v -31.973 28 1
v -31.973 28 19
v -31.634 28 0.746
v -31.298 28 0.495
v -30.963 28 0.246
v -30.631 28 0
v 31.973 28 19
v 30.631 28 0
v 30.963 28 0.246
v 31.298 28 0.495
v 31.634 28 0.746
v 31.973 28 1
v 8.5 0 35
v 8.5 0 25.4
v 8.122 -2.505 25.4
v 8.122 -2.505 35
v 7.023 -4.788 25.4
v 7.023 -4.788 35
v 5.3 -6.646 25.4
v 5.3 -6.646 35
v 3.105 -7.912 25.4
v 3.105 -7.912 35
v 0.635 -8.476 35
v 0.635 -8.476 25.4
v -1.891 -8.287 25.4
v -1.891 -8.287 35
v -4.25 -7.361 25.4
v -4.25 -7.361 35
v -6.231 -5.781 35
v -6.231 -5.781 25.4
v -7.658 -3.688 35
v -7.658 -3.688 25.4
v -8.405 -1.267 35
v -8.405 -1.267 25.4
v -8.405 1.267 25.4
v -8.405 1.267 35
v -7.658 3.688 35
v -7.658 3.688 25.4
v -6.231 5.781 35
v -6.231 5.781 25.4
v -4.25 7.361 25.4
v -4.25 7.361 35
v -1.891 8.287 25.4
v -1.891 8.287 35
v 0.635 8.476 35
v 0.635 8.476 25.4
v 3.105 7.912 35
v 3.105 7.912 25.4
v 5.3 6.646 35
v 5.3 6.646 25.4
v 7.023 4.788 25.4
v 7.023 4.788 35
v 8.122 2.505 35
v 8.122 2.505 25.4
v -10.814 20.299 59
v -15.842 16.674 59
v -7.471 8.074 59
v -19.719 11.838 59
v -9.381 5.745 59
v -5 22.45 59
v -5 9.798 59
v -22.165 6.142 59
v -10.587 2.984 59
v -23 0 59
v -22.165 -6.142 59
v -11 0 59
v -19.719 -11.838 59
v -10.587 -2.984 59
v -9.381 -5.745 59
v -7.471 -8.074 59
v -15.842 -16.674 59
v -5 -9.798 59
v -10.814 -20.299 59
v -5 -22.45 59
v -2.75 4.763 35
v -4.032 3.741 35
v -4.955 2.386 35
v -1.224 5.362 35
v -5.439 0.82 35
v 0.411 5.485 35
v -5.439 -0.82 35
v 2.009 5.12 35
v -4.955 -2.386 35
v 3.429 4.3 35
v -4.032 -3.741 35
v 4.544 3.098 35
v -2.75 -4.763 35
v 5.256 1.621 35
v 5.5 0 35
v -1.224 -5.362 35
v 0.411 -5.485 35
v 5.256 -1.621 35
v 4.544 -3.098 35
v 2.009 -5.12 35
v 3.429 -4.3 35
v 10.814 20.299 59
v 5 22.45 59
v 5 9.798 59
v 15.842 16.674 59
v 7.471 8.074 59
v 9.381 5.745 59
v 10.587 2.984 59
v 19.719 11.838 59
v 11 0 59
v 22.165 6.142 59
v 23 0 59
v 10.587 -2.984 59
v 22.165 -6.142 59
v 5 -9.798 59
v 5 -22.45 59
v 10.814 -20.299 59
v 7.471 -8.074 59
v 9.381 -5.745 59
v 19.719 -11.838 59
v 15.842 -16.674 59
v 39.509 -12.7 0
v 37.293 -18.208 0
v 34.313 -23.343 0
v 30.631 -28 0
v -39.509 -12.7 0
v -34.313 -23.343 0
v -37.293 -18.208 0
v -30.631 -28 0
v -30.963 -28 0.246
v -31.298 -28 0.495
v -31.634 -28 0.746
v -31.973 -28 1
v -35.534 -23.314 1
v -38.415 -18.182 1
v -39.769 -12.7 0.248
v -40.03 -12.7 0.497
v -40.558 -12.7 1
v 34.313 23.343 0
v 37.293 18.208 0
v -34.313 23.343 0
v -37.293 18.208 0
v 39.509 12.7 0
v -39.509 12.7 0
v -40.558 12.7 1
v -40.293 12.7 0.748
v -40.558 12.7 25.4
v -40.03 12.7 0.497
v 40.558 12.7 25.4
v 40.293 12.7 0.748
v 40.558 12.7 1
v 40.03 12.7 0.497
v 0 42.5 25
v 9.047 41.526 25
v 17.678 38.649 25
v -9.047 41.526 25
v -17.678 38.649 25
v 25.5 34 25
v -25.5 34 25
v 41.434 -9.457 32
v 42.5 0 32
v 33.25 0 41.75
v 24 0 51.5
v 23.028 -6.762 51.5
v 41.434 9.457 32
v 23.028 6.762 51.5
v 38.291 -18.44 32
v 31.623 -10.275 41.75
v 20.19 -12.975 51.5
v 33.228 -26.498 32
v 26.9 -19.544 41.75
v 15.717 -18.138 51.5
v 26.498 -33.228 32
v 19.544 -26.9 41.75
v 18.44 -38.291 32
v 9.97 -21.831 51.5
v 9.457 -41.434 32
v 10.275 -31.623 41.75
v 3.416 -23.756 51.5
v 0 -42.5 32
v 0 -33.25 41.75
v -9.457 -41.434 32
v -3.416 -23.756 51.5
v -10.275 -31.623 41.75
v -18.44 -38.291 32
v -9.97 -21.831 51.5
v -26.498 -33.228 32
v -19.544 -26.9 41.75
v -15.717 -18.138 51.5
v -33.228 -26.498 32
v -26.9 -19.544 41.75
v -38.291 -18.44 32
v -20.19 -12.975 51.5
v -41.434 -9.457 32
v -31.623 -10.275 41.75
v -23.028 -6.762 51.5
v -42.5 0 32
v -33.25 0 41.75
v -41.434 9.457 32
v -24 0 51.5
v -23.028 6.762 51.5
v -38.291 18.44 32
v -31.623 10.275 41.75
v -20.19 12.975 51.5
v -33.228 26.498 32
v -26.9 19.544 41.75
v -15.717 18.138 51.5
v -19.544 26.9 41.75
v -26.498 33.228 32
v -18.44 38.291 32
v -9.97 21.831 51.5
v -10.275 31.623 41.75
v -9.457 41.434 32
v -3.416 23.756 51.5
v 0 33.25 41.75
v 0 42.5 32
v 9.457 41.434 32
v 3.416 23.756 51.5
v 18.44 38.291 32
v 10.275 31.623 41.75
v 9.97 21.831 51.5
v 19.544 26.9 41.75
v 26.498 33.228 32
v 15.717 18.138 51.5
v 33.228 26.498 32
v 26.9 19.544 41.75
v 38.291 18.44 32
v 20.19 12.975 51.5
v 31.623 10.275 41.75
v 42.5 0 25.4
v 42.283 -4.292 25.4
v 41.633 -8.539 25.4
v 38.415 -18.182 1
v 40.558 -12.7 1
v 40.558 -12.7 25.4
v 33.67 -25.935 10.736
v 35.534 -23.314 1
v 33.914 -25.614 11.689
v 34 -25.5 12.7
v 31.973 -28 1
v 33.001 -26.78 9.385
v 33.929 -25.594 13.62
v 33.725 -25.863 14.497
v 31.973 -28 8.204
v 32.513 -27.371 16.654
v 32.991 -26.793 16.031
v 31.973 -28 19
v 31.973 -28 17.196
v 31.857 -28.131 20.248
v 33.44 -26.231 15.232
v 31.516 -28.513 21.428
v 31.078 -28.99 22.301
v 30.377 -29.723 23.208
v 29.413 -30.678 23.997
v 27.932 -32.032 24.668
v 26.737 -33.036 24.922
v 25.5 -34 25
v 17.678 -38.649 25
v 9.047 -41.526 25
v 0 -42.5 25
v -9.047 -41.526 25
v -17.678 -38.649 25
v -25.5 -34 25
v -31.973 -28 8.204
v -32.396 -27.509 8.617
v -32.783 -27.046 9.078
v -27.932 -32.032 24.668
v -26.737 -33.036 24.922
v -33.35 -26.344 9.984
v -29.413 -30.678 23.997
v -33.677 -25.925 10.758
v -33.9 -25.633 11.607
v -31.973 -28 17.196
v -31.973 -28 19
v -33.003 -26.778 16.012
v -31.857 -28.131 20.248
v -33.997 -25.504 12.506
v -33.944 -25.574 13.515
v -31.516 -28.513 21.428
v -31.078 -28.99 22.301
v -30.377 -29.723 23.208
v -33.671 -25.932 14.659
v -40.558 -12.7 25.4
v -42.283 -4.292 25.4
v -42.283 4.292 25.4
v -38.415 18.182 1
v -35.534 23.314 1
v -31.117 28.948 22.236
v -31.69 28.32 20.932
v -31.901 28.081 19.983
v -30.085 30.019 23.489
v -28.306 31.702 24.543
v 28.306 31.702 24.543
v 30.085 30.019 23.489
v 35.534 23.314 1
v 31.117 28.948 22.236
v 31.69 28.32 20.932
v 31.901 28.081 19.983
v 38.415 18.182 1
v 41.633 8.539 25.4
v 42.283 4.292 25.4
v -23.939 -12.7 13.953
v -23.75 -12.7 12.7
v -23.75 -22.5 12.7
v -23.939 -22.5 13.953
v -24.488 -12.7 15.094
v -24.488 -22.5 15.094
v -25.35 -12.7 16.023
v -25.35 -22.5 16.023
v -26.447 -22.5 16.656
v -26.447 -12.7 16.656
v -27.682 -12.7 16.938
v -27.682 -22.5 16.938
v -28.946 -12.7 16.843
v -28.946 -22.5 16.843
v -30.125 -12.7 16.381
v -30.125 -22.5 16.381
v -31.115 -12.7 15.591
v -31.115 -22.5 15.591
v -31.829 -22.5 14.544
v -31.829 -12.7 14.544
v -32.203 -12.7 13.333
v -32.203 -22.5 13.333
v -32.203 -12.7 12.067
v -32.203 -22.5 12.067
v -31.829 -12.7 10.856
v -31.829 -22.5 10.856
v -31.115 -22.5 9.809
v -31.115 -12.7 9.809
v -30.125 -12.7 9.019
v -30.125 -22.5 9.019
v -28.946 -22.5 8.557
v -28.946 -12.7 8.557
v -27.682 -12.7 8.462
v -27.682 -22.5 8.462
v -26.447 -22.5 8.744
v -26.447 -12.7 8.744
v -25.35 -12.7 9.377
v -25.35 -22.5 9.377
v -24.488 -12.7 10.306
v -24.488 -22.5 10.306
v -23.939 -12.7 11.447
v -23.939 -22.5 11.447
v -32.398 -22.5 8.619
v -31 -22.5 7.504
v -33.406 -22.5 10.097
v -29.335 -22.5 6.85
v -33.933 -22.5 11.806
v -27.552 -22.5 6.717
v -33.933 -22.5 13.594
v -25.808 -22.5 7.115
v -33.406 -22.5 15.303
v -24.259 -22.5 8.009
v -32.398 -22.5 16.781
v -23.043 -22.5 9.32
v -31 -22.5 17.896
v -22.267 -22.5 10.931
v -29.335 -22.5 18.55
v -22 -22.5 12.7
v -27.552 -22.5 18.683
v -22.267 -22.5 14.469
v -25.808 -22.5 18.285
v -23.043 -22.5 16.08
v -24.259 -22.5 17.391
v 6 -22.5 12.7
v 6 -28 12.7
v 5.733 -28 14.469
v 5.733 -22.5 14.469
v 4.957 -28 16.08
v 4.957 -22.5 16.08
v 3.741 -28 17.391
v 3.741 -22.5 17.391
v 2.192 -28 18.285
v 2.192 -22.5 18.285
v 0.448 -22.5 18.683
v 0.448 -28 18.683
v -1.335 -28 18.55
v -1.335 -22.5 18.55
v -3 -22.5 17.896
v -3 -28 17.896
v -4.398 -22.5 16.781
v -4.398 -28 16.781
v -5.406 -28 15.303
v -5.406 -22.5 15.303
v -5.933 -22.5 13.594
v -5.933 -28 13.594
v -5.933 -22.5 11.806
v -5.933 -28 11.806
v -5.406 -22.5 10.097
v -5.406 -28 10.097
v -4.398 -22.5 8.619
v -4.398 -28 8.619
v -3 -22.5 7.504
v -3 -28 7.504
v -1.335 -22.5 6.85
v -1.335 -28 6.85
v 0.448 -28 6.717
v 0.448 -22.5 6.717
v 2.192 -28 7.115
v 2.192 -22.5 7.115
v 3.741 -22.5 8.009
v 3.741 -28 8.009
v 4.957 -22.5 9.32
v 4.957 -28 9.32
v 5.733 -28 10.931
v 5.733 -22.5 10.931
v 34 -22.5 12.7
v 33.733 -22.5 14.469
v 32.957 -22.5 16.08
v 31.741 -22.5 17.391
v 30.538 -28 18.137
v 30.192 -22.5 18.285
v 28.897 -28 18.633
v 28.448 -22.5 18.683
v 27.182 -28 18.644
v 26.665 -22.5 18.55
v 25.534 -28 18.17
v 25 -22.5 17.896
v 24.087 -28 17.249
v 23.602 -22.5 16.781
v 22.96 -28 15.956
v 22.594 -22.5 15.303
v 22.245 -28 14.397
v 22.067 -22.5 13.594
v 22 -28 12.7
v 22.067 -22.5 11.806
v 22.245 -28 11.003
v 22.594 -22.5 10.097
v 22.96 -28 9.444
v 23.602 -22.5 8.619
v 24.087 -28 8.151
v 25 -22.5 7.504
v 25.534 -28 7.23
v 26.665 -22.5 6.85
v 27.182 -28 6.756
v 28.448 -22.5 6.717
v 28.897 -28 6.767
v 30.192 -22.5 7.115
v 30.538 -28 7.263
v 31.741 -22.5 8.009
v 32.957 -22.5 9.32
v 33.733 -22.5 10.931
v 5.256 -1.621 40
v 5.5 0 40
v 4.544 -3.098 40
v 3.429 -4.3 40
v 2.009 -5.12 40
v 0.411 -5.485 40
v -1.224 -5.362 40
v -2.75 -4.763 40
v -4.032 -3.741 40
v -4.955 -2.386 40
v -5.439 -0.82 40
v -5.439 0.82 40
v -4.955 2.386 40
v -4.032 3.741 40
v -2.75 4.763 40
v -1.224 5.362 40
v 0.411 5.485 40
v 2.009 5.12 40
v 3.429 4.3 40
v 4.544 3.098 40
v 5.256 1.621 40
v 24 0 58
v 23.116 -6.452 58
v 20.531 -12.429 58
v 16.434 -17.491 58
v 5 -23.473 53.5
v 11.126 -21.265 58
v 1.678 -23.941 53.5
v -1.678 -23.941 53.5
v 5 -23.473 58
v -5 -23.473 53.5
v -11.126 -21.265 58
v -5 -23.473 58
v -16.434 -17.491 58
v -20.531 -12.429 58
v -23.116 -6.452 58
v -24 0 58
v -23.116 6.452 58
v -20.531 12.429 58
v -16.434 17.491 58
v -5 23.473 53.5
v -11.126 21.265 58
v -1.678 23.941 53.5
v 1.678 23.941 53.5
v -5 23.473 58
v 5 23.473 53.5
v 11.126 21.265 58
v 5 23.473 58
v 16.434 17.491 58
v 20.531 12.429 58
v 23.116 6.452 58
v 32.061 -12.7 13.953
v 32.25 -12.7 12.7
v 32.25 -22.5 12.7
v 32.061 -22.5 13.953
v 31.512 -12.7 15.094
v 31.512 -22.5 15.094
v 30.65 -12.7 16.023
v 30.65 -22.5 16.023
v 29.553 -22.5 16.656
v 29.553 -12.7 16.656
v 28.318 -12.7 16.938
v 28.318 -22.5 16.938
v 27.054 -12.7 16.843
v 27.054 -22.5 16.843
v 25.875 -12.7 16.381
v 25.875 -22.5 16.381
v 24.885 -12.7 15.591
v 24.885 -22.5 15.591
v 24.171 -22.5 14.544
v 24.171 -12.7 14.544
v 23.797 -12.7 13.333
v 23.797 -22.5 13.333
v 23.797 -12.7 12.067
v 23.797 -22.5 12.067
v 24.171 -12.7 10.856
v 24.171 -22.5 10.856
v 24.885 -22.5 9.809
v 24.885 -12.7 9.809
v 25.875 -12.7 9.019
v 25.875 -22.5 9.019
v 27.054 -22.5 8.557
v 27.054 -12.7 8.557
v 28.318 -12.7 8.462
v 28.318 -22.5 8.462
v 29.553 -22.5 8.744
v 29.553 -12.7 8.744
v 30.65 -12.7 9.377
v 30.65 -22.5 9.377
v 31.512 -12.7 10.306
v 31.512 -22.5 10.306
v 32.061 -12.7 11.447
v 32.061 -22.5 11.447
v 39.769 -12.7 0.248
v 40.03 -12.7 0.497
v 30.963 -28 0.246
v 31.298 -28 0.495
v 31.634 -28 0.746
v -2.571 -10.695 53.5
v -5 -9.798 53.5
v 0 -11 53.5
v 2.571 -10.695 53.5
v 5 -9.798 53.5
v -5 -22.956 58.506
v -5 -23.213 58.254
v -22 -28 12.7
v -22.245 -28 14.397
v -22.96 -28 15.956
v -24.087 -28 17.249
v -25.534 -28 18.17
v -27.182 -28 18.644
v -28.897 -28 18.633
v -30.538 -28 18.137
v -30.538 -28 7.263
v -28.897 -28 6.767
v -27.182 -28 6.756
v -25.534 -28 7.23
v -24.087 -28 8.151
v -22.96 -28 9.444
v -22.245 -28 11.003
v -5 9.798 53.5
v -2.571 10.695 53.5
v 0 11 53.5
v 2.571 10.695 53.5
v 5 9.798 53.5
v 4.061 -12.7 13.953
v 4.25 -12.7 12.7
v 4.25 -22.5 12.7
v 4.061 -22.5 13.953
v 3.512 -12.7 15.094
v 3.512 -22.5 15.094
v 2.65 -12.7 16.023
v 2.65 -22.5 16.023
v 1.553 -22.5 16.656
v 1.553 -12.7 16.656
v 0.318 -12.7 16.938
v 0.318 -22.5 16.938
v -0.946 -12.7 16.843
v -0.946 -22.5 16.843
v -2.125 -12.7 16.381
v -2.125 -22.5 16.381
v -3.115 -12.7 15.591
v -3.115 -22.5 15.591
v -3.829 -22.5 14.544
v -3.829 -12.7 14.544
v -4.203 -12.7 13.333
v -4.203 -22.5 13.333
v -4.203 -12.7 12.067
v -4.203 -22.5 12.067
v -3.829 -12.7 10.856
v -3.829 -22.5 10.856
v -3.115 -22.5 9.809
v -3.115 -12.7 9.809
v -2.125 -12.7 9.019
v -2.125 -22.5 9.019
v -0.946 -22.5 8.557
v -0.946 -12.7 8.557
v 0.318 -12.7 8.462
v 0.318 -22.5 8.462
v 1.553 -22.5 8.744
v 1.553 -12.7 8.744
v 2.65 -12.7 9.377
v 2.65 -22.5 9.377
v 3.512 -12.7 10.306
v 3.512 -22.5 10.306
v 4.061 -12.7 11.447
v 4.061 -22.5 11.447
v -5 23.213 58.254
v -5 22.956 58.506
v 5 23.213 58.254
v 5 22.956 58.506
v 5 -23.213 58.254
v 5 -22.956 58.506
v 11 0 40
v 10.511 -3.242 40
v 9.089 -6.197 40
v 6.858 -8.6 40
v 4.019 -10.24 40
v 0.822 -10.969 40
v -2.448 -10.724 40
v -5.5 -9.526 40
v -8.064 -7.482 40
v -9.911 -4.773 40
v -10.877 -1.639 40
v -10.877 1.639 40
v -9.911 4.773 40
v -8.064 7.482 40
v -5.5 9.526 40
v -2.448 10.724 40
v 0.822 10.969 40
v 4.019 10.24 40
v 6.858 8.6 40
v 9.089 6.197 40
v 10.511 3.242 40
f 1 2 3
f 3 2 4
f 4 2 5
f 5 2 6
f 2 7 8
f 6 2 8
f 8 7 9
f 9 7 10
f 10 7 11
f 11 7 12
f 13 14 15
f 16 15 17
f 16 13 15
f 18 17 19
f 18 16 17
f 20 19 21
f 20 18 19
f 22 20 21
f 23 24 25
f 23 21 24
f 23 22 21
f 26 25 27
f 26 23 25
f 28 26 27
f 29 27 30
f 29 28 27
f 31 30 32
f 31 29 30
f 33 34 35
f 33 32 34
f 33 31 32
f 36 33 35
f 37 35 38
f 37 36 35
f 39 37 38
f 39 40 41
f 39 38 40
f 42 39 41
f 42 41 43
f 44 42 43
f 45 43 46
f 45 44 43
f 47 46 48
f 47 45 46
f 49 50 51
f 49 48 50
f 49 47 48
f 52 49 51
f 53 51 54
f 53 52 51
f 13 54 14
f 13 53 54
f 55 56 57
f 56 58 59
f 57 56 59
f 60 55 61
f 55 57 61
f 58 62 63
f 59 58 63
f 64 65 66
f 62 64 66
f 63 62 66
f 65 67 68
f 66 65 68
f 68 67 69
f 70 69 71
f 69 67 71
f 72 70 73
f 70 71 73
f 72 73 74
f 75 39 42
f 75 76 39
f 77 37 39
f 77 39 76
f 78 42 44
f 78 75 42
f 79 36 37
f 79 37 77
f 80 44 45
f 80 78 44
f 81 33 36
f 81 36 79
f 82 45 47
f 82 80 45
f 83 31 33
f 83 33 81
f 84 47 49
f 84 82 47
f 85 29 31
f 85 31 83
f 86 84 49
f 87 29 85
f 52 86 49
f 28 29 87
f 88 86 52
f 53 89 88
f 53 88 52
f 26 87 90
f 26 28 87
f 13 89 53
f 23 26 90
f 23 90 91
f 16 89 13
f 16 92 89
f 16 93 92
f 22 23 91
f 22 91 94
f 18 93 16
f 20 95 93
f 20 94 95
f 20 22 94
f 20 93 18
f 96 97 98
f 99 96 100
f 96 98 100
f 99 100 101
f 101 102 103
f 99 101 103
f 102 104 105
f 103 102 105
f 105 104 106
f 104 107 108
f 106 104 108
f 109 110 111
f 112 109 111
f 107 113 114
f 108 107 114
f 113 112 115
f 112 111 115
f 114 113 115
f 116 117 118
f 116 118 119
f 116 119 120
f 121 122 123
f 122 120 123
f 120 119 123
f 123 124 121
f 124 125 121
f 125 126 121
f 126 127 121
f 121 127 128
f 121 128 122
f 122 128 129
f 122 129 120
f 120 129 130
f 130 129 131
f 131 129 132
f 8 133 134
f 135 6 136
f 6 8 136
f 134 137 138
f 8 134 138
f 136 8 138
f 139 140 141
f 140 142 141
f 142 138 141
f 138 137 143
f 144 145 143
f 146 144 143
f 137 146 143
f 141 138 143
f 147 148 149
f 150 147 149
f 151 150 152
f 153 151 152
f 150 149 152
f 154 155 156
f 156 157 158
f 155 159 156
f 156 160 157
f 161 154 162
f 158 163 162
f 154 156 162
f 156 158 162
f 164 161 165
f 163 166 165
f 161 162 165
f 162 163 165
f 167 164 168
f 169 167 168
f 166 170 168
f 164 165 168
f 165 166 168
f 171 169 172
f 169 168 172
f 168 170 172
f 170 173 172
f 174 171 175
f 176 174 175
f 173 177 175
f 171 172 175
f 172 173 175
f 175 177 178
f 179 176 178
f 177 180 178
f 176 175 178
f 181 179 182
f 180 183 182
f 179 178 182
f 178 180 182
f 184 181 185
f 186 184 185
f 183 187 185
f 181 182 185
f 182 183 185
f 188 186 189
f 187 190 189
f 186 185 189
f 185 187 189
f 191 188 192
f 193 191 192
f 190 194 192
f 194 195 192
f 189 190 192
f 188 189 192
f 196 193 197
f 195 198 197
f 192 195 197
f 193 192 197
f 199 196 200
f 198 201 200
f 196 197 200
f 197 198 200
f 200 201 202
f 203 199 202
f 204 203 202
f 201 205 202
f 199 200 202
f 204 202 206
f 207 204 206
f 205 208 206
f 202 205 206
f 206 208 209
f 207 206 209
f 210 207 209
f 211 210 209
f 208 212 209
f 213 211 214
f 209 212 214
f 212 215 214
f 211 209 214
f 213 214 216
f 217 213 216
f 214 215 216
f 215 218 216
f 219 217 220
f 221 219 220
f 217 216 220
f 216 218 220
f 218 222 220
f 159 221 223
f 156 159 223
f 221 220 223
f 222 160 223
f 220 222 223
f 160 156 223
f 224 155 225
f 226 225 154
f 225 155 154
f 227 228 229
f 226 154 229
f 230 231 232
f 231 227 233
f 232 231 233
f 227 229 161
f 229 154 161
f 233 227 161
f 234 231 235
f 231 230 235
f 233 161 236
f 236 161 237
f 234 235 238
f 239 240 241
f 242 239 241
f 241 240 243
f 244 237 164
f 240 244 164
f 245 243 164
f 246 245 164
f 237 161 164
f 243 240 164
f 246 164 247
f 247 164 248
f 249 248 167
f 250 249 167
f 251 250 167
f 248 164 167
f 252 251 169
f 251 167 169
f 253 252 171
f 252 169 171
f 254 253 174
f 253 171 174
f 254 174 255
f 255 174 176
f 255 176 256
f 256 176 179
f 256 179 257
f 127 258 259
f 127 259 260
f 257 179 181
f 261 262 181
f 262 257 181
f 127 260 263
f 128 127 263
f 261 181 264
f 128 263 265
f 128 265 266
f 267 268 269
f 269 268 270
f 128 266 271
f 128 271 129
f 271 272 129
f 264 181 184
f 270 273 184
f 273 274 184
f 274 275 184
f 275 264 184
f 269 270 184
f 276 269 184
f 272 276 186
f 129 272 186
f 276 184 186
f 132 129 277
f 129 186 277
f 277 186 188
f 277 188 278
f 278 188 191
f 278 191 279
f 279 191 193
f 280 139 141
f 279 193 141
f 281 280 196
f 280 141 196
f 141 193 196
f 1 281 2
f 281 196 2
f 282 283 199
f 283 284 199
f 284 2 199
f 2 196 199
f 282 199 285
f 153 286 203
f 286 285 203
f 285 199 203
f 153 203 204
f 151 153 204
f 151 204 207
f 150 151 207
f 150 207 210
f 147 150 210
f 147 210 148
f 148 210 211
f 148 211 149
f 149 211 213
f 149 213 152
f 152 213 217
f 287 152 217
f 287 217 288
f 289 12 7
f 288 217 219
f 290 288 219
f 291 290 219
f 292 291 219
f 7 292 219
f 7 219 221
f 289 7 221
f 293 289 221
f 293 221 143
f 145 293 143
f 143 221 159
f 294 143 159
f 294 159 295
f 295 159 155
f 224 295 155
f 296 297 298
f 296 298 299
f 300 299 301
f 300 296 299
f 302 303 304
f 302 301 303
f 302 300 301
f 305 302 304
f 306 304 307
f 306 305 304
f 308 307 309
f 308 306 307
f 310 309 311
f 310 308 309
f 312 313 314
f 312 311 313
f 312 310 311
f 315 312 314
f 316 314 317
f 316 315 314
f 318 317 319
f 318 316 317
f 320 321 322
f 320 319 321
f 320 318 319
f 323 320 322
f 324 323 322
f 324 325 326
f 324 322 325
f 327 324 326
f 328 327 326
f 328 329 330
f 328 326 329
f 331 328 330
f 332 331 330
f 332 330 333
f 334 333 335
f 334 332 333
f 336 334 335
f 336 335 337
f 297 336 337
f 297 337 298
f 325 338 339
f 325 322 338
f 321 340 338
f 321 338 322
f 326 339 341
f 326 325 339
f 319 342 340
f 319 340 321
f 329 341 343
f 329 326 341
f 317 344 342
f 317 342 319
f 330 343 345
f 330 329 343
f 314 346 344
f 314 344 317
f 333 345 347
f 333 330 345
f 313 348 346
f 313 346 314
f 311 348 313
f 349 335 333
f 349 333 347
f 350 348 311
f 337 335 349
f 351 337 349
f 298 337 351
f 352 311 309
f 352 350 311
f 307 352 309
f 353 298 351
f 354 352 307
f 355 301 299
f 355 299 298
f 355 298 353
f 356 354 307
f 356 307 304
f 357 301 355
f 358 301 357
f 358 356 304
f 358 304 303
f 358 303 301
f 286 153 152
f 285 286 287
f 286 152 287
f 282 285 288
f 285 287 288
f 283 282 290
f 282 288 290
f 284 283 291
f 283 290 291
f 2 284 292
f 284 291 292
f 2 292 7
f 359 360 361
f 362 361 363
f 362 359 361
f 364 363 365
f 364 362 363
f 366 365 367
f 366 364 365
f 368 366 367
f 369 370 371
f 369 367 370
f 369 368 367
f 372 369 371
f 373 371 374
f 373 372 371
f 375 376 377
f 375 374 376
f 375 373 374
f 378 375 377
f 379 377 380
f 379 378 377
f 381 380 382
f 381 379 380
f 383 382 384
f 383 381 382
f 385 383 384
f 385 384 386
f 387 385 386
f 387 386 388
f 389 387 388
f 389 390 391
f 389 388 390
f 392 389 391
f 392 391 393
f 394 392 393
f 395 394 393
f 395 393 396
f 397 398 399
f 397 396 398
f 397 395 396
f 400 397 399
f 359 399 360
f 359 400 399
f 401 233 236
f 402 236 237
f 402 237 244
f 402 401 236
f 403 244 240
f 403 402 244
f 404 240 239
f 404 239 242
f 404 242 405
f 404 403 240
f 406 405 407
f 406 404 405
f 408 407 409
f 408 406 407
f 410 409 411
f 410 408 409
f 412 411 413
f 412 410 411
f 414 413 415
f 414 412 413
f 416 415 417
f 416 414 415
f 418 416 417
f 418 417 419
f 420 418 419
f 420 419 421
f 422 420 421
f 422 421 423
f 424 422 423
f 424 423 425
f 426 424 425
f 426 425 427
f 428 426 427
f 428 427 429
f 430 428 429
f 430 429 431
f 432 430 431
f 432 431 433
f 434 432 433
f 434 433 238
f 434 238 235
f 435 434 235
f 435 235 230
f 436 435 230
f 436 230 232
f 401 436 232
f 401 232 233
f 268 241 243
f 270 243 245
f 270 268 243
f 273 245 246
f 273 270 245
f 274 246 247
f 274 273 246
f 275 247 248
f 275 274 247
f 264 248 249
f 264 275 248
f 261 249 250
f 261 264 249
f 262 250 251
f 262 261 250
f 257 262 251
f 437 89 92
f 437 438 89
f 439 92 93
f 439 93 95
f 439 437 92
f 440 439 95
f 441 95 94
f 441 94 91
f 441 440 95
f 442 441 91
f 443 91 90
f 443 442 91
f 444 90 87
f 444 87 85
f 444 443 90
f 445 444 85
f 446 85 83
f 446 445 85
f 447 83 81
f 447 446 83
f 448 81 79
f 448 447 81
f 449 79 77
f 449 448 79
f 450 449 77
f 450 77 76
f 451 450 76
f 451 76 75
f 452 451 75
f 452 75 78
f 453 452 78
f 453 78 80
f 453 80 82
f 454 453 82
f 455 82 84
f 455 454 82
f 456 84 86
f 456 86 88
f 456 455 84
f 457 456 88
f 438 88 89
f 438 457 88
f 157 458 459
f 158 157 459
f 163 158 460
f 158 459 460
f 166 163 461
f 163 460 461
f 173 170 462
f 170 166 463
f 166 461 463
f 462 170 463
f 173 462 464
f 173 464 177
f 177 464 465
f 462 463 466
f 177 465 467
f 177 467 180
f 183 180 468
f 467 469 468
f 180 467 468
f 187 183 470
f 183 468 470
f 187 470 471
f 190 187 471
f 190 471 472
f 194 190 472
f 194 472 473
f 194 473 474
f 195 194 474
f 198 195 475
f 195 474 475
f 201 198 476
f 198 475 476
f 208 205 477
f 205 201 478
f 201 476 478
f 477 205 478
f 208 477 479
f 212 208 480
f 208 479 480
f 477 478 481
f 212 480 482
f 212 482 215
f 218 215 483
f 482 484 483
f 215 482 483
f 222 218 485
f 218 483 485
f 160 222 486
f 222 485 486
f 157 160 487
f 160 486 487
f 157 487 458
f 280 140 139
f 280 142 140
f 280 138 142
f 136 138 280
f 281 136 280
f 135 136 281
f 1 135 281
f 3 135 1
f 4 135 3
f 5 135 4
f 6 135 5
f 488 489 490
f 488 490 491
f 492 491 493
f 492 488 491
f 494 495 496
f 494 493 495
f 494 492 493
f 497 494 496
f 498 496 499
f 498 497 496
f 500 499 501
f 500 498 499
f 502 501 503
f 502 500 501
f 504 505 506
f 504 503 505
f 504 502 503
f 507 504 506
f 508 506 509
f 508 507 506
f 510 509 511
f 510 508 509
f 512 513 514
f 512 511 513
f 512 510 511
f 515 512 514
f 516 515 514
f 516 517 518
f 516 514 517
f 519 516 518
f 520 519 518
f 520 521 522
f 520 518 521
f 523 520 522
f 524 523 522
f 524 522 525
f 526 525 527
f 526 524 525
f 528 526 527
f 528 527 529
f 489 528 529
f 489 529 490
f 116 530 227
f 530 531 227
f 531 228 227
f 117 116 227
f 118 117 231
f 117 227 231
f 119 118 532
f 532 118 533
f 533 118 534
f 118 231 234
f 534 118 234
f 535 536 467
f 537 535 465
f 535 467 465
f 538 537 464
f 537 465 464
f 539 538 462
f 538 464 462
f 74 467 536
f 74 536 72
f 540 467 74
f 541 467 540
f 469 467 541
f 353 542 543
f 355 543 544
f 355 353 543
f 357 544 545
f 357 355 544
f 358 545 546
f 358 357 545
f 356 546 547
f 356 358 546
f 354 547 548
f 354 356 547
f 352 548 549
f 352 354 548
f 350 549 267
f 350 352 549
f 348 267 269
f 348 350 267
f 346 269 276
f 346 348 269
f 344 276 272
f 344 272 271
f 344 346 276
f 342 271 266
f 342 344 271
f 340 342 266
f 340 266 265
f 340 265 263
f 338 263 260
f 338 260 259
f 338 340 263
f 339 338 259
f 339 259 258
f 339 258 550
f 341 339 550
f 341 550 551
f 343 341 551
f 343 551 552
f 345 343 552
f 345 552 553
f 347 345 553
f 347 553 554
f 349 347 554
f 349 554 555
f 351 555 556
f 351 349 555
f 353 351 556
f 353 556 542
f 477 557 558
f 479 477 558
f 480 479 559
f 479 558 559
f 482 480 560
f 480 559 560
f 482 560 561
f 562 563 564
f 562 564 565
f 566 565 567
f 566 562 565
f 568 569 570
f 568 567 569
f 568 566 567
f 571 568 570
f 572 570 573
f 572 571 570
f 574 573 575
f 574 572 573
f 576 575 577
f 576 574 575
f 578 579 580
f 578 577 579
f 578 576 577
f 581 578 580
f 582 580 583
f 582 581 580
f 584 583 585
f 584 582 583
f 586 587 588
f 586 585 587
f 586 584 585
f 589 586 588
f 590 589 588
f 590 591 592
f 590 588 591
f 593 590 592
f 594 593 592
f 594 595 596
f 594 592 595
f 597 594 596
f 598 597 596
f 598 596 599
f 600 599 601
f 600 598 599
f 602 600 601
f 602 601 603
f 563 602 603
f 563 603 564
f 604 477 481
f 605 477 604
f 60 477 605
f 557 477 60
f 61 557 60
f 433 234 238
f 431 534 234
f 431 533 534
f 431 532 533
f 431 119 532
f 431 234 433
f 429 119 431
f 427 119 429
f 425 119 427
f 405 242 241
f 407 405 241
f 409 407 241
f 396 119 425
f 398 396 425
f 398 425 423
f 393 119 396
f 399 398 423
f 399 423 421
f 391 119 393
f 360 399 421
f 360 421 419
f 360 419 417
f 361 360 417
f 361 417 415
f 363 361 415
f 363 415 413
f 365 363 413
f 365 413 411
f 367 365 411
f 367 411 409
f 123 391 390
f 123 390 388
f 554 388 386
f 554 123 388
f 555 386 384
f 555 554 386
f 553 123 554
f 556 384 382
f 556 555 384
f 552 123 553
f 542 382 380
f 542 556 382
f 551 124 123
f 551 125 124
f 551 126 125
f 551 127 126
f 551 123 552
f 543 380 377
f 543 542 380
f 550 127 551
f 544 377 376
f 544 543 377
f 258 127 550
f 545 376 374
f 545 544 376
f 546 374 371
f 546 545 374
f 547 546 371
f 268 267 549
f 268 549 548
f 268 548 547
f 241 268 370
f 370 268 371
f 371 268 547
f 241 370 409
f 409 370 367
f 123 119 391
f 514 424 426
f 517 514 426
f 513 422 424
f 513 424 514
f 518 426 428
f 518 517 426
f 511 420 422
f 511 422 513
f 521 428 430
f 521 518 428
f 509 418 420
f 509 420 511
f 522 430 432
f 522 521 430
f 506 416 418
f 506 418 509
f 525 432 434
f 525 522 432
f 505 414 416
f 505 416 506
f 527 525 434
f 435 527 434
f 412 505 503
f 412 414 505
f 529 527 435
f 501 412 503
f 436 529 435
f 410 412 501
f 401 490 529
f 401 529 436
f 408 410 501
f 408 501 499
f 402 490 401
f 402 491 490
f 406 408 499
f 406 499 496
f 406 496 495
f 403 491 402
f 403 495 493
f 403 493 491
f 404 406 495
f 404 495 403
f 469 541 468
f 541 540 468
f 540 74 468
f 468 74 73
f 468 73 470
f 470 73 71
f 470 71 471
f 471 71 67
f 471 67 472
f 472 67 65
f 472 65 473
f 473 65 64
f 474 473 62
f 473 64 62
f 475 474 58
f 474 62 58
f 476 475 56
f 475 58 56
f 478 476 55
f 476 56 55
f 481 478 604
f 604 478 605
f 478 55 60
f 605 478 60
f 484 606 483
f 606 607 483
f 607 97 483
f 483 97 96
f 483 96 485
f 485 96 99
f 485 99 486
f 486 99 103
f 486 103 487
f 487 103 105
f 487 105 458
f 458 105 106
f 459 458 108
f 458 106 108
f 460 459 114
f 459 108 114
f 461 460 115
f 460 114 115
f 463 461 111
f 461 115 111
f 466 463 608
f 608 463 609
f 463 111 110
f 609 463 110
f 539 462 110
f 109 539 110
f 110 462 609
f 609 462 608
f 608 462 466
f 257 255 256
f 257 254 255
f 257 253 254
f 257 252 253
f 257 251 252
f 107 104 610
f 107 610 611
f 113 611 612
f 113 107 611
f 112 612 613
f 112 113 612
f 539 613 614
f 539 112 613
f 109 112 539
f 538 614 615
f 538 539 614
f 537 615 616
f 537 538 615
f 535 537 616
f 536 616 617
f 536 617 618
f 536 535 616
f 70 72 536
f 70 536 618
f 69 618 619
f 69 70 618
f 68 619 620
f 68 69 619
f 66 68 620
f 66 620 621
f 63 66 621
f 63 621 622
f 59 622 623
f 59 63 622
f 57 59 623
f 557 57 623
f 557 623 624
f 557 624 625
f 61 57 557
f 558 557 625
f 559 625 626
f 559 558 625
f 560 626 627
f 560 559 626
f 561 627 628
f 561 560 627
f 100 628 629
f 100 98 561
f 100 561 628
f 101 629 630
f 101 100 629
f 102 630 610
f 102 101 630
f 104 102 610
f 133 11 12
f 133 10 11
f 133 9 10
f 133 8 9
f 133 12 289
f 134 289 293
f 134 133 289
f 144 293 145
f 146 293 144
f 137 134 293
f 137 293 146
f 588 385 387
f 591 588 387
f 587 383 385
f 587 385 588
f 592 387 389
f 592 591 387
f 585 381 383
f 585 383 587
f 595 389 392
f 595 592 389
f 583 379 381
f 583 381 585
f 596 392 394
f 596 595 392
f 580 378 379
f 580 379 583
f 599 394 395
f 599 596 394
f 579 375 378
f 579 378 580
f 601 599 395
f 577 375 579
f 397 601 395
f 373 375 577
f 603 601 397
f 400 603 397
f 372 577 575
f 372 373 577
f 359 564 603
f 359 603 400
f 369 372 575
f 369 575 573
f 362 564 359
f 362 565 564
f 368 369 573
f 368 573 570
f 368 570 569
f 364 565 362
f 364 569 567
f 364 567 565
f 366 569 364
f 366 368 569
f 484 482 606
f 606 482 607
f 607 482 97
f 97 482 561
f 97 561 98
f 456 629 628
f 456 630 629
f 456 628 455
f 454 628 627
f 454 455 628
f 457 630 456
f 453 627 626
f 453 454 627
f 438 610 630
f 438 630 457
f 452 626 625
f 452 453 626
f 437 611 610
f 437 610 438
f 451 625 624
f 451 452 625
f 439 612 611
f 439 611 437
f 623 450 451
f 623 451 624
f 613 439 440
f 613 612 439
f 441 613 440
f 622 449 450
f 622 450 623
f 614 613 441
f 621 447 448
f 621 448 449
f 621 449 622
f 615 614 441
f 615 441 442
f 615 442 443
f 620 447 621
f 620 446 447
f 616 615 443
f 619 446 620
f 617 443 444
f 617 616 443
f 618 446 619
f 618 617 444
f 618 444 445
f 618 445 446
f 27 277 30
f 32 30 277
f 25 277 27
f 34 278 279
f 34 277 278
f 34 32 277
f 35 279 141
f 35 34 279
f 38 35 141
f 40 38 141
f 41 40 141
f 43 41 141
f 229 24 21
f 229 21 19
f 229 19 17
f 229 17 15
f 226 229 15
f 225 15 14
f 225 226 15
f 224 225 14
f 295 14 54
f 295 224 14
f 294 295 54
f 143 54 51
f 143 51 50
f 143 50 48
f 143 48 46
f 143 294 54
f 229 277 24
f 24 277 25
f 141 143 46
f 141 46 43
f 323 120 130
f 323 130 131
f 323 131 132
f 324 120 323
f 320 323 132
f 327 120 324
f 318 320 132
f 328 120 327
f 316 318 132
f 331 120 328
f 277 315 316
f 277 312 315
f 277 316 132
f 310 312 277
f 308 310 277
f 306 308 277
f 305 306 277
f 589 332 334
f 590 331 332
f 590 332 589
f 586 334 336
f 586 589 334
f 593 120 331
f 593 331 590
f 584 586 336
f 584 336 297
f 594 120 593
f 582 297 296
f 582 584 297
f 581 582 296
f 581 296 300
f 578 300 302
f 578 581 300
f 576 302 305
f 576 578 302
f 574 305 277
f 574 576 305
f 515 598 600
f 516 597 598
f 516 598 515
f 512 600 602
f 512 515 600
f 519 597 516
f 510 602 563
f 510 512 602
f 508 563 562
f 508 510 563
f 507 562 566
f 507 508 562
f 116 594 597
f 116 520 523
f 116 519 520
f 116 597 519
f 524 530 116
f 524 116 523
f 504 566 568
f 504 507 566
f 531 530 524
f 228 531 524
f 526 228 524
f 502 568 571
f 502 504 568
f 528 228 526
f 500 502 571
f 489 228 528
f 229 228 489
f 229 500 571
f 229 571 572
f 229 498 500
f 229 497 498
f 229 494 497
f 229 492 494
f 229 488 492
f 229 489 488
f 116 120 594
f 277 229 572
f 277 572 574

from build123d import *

# Parameters (mm, degrees)
F2_W      = 5.5
F2_H      = 5
F4_W      = 25.4
F4_H      = 25.4
F5_DEPTH  = 50
F6_W      = 10
F6_H      = 5.5
F7_DEPTH  = 25
F8_R      = 4.25
F9_DEPTH  = 50
F10_SIZE  = 1
F12_R     = 6
F13_DEPTH = 25
F15_DEPTH = 40


with BuildPart() as f1:
    # F0 (on Front) → F1 (revolve)
    with BuildSketch(Plane.XZ):
        Polygon((0, 59), (0, 0), (42.5, 0), (42.5, 32), (24, 51.5), (24, 59), align=None)
    revolve(axis=Axis((0, 0, 29.5), (0, 0, -1)))

    # F2 (on Front) → F3 (revolve, cut)
    with BuildSketch(Plane.XZ):
        Polygon((5.5, 35), (0, 35), (0, 25), (8.5, 25), (8.5, 35), align=None)
        with Locations((2.75, 37.5)):
            Rectangle(F2_W, F2_H)
        Polygon((11, 59), (0, 59), (0, 40), (5.5, 40), (11, 40), align=None)
    revolve(axis=Axis((0, 0, 30), (0, 0, -1)), mode=Mode.SUBTRACT)

    # F4 (on Right) → F5 (cut, symmetric)
    with BuildSketch(Plane.YZ):
        with Locations((0, 12.7)):
            Rectangle(F4_W, F4_H)
    extrude(amount=F5_DEPTH, both=True, mode=Mode.SUBTRACT)

    # F6 (on Front) → F7 (cut, symmetric)
    with BuildSketch(Plane.XZ):
        with Locations((0, 56.25)):
            Rectangle(F6_W, F6_H)
    extrude(amount=F7_DEPTH, both=True, mode=Mode.SUBTRACT)

    # F8 (on Front) → F9 (cut)
    with BuildSketch(Plane.XZ):
        with Locations((0, 12.7)):
            Circle(F8_R)
        with Locations((28, 12.7)):
            Circle(F8_R)
        with Locations((-28, 12.7)):
            Circle(F8_R)
    extrude(amount=F9_DEPTH, mode=Mode.SUBTRACT)

    # F10
    f10_edges = [f1.edges().sort_by_distance(p)[0] for p in [
        (0, -42.5, 0),
        (0, 42.5, 0),
        (-24, 0, 59),
        (18.654758, -15.099669, 59),
        (18.654758, 15.099669, 59),
    ]]
    chamfer(f10_edges, length=F10_SIZE)

    # F12 (on offset) → F13 (cut)
    with BuildSketch(Plane.XZ.offset(22.5)):
        with Locations((0, 12.7)):
            Circle(F12_R)
        with Locations((-28, 12.7)):
            Circle(F12_R)
        with Locations((28, 12.7)):
            Circle(F12_R)
    extrude(amount=F13_DEPTH, mode=Mode.SUBTRACT)

    # F14 (on Right) → F15 (cut, symmetric)
    with BuildSketch(Plane.YZ):
        with BuildLine():
            Line((-34, 25), (-49.6562516332, 25))
            Line((-49.6562516332, 25), (-49.6562516332, -7.5937491908))
            Line((-49.6562516332, -7.5937491908), (-28, -7.5937491908))
            Line((-28, -7.5937491908), (-28, 19))
            ThreePointArc((-28, 19), (-29.7573593129, 23.2426406871), (-34, 25))
        make_face()
        with BuildLine():
            Line((49.6562516332, -7.5937491908), (49.6562516332, 25))
            Line((49.6562516332, 25), (34, 25))
            ThreePointArc((34, 25), (29.7573593129, 23.2426406871), (28, 19))
            Line((28, 19), (28, -7.5937491908))
            Line((28, -7.5937491908), (49.6562516332, -7.5937491908))
        make_face()
    extrude(amount=F15_DEPTH, both=True, mode=Mode.SUBTRACT)


solid = f1.part
